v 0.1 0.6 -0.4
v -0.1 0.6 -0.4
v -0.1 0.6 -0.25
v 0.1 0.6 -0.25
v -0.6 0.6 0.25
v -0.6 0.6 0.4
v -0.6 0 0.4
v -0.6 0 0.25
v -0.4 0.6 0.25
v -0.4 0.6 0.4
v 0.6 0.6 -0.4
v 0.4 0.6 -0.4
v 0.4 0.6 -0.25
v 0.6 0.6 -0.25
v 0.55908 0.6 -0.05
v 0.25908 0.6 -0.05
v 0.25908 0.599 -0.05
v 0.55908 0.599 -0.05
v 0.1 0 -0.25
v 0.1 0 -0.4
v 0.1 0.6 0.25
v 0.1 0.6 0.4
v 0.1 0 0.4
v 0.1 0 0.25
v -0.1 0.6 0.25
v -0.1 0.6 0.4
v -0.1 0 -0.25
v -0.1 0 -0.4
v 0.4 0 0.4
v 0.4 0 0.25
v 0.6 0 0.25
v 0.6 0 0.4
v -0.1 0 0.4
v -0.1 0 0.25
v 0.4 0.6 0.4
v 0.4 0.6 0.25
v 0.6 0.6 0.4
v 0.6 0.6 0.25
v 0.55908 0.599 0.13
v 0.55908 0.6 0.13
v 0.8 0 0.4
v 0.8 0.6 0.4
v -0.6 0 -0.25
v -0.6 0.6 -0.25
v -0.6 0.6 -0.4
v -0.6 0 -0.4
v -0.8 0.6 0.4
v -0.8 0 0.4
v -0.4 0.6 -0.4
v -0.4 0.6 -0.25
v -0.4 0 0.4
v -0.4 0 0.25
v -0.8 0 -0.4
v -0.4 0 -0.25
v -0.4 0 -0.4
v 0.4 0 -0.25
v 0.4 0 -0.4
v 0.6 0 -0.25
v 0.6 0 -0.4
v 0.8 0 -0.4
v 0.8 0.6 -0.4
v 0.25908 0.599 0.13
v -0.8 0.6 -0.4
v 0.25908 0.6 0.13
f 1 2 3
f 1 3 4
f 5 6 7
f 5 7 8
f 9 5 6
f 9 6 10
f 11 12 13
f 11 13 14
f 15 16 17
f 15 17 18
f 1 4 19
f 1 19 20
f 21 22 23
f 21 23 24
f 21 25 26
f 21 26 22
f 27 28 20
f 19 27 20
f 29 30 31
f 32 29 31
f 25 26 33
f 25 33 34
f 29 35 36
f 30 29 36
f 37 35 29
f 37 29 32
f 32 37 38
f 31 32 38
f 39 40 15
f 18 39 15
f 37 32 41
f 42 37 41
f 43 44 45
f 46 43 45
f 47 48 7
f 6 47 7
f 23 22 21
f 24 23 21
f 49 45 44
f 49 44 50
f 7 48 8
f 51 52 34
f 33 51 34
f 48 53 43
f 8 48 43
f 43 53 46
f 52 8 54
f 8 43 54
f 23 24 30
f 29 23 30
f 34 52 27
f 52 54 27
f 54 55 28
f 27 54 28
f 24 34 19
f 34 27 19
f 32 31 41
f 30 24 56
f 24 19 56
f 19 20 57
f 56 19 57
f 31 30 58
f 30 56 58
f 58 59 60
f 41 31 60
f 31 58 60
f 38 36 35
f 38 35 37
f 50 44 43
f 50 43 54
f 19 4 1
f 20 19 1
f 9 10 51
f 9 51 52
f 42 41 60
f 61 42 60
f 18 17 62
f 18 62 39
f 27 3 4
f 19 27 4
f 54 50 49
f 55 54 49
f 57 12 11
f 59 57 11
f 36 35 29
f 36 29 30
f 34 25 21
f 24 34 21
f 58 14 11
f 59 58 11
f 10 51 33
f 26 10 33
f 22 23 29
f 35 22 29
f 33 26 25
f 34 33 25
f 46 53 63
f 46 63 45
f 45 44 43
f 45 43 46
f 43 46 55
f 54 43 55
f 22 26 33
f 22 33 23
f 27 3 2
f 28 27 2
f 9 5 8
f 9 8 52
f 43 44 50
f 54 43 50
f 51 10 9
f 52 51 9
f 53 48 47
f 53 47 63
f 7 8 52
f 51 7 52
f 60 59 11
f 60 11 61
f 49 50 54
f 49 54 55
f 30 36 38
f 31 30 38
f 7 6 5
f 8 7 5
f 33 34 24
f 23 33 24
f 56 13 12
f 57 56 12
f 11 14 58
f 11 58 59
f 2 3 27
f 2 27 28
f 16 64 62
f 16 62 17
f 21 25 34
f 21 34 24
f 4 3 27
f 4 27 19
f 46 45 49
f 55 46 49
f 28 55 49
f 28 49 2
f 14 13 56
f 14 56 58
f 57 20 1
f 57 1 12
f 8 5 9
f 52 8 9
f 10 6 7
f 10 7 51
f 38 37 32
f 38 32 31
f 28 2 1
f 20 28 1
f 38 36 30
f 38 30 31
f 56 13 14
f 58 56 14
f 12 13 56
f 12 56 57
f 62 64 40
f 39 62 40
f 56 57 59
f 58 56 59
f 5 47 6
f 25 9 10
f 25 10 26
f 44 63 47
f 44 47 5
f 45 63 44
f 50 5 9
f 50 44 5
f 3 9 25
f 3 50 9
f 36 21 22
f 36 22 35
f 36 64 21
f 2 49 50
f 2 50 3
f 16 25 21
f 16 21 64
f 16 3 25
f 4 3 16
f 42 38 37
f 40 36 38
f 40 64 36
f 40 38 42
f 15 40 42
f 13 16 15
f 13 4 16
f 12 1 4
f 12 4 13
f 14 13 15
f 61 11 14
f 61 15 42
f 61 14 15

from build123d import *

# Parameters (mm, degrees)
SKETCH1_W             = 1.6
SKETCH1_H             = 0.8
BOSS_EXTRUDE1_DEPTH   = 0.6
SKETCH2_W             = 0.2
SKETCH2_H             = 0.15
CUT_EXTRUDE1_DEPTH    = 1
SKETCH3_W             = 0.2
SKETCH3_H             = 0.15
BOSS_EXTRUDE3_DEPTH   = 0.6
BOSS_EXTRUDE3_2_DEPTH = 0.6
BOSS_EXTRUDE3_3_DEPTH = 0.6
BOSS_EXTRUDE3_4_DEPTH = 0.6
BOSS_EXTRUDE3_5_DEPTH = 0.6
BOSS_EXTRUDE3_6_DEPTH = 0.6
SKETCH4_W             = 0.3
SKETCH4_H             = 0.18
CUT_EXTRUDE2_DEPTH    = 0.001


with BuildPart() as part:
    # Sketch1 → Boss-Extrude1 (new body)
    with BuildSketch(Plane(origin=(0, 0, 0), x_dir=(1, 0, 0), z_dir=(0, 1, 0))):
        Rectangle(SKETCH1_W, SKETCH1_H)
    extrude(amount=BOSS_EXTRUDE1_DEPTH)

    # Sketch2 → Cut-Extrude1 (cut)
    with BuildSketch(Plane(origin=(0, 0.6, 0), x_dir=(1, 0, 0), z_dir=(0, 1, 0))):
        with Locations((0.5, -0.325)):
            Rectangle(SKETCH2_W, SKETCH2_H)
        with Locations((0, -0.325)):
            Rectangle(SKETCH2_W, SKETCH2_H)
        with Locations((-0.5, -0.325)):
            Rectangle(SKETCH2_W, SKETCH2_H)
        with Locations((0, 0.325)):
            Rectangle(SKETCH2_W, SKETCH2_H)
        with Locations((0.5, 0.325)):
            Rectangle(SKETCH2_W, SKETCH2_H)
        with Locations((-0.5, 0.325)):
            Rectangle(SKETCH2_W, SKETCH2_H)
    extrude(amount=-CUT_EXTRUDE1_DEPTH, mode=Mode.SUBTRACT)

    # Sketch4 → Cut-Extrude2 (cut)
    with BuildSketch(Plane(origin=(0, 0.6, 0), x_dir=(1, 0, 0), z_dir=(0, 1, 0))):
        with Locations((0.409078339, -0.04)):
            Rectangle(SKETCH4_W, SKETCH4_H)
    extrude(amount=-CUT_EXTRUDE2_DEPTH, mode=Mode.SUBTRACT)


with BuildPart() as body_2:
    # Sketch3 → Boss-Extrude3 (new body)
    with BuildSketch(Plane(origin=(0, 0.6, 0), x_dir=(1, 0, 0), z_dir=(0, 1, 0))):
        with Locations((-0.5, 0.325)):
            Rectangle(SKETCH3_W, SKETCH3_H)
    extrude(amount=-BOSS_EXTRUDE3_DEPTH)


with BuildPart() as body_3:
    # Sketch3 → Boss-Extrude3 2 (new body)
    with BuildSketch(Plane(origin=(0, 0.6, 0), x_dir=(1, 0, 0), z_dir=(0, 1, 0))):
        with Locations((0.5, -0.325)):
            Rectangle(SKETCH3_W, SKETCH3_H)
    extrude(amount=-BOSS_EXTRUDE3_2_DEPTH)


with BuildPart() as body_4:
    # Sketch3 → Boss-Extrude3 3 (new body)
    with BuildSketch(Plane(origin=(0, 0.6, 0), x_dir=(1, 0, 0), z_dir=(0, 1, 0))):
        with Locations((-0.5, -0.325)):
            Rectangle(SKETCH3_W, SKETCH3_H)
    extrude(amount=-BOSS_EXTRUDE3_3_DEPTH)


with BuildPart() as body_5:
    # Sketch3 → Boss-Extrude3 4 (new body)
    with BuildSketch(Plane(origin=(0, 0.6, 0), x_dir=(1, 0, 0), z_dir=(0, 1, 0))):
        with Locations((0, -0.325)):
            Rectangle(SKETCH3_W, SKETCH3_H)
    extrude(amount=-BOSS_EXTRUDE3_4_DEPTH)


with BuildPart() as body_6:
    # Sketch3 → Boss-Extrude3 5 (new body)
    with BuildSketch(Plane(origin=(0, 0.6, 0), x_dir=(1, 0, 0), z_dir=(0, 1, 0))):
        with Locations((0.5, 0.325)):
            Rectangle(SKETCH3_W, SKETCH3_H)
    extrude(amount=-BOSS_EXTRUDE3_5_DEPTH)


with BuildPart() as body_7:
    # Sketch3 → Boss-Extrude3 6 (new body)
    with BuildSketch(Plane(origin=(0, 0.6, 0), x_dir=(1, 0, 0), z_dir=(0, 1, 0))):
        with Locations((0, 0.325)):
            Rectangle(SKETCH3_W, SKETCH3_H)
    extrude(amount=-BOSS_EXTRUDE3_6_DEPTH)


solid = Compound([part.part, body_2.part, body_3.part, body_4.part, body_5.part, body_6.part, body_7.part])
